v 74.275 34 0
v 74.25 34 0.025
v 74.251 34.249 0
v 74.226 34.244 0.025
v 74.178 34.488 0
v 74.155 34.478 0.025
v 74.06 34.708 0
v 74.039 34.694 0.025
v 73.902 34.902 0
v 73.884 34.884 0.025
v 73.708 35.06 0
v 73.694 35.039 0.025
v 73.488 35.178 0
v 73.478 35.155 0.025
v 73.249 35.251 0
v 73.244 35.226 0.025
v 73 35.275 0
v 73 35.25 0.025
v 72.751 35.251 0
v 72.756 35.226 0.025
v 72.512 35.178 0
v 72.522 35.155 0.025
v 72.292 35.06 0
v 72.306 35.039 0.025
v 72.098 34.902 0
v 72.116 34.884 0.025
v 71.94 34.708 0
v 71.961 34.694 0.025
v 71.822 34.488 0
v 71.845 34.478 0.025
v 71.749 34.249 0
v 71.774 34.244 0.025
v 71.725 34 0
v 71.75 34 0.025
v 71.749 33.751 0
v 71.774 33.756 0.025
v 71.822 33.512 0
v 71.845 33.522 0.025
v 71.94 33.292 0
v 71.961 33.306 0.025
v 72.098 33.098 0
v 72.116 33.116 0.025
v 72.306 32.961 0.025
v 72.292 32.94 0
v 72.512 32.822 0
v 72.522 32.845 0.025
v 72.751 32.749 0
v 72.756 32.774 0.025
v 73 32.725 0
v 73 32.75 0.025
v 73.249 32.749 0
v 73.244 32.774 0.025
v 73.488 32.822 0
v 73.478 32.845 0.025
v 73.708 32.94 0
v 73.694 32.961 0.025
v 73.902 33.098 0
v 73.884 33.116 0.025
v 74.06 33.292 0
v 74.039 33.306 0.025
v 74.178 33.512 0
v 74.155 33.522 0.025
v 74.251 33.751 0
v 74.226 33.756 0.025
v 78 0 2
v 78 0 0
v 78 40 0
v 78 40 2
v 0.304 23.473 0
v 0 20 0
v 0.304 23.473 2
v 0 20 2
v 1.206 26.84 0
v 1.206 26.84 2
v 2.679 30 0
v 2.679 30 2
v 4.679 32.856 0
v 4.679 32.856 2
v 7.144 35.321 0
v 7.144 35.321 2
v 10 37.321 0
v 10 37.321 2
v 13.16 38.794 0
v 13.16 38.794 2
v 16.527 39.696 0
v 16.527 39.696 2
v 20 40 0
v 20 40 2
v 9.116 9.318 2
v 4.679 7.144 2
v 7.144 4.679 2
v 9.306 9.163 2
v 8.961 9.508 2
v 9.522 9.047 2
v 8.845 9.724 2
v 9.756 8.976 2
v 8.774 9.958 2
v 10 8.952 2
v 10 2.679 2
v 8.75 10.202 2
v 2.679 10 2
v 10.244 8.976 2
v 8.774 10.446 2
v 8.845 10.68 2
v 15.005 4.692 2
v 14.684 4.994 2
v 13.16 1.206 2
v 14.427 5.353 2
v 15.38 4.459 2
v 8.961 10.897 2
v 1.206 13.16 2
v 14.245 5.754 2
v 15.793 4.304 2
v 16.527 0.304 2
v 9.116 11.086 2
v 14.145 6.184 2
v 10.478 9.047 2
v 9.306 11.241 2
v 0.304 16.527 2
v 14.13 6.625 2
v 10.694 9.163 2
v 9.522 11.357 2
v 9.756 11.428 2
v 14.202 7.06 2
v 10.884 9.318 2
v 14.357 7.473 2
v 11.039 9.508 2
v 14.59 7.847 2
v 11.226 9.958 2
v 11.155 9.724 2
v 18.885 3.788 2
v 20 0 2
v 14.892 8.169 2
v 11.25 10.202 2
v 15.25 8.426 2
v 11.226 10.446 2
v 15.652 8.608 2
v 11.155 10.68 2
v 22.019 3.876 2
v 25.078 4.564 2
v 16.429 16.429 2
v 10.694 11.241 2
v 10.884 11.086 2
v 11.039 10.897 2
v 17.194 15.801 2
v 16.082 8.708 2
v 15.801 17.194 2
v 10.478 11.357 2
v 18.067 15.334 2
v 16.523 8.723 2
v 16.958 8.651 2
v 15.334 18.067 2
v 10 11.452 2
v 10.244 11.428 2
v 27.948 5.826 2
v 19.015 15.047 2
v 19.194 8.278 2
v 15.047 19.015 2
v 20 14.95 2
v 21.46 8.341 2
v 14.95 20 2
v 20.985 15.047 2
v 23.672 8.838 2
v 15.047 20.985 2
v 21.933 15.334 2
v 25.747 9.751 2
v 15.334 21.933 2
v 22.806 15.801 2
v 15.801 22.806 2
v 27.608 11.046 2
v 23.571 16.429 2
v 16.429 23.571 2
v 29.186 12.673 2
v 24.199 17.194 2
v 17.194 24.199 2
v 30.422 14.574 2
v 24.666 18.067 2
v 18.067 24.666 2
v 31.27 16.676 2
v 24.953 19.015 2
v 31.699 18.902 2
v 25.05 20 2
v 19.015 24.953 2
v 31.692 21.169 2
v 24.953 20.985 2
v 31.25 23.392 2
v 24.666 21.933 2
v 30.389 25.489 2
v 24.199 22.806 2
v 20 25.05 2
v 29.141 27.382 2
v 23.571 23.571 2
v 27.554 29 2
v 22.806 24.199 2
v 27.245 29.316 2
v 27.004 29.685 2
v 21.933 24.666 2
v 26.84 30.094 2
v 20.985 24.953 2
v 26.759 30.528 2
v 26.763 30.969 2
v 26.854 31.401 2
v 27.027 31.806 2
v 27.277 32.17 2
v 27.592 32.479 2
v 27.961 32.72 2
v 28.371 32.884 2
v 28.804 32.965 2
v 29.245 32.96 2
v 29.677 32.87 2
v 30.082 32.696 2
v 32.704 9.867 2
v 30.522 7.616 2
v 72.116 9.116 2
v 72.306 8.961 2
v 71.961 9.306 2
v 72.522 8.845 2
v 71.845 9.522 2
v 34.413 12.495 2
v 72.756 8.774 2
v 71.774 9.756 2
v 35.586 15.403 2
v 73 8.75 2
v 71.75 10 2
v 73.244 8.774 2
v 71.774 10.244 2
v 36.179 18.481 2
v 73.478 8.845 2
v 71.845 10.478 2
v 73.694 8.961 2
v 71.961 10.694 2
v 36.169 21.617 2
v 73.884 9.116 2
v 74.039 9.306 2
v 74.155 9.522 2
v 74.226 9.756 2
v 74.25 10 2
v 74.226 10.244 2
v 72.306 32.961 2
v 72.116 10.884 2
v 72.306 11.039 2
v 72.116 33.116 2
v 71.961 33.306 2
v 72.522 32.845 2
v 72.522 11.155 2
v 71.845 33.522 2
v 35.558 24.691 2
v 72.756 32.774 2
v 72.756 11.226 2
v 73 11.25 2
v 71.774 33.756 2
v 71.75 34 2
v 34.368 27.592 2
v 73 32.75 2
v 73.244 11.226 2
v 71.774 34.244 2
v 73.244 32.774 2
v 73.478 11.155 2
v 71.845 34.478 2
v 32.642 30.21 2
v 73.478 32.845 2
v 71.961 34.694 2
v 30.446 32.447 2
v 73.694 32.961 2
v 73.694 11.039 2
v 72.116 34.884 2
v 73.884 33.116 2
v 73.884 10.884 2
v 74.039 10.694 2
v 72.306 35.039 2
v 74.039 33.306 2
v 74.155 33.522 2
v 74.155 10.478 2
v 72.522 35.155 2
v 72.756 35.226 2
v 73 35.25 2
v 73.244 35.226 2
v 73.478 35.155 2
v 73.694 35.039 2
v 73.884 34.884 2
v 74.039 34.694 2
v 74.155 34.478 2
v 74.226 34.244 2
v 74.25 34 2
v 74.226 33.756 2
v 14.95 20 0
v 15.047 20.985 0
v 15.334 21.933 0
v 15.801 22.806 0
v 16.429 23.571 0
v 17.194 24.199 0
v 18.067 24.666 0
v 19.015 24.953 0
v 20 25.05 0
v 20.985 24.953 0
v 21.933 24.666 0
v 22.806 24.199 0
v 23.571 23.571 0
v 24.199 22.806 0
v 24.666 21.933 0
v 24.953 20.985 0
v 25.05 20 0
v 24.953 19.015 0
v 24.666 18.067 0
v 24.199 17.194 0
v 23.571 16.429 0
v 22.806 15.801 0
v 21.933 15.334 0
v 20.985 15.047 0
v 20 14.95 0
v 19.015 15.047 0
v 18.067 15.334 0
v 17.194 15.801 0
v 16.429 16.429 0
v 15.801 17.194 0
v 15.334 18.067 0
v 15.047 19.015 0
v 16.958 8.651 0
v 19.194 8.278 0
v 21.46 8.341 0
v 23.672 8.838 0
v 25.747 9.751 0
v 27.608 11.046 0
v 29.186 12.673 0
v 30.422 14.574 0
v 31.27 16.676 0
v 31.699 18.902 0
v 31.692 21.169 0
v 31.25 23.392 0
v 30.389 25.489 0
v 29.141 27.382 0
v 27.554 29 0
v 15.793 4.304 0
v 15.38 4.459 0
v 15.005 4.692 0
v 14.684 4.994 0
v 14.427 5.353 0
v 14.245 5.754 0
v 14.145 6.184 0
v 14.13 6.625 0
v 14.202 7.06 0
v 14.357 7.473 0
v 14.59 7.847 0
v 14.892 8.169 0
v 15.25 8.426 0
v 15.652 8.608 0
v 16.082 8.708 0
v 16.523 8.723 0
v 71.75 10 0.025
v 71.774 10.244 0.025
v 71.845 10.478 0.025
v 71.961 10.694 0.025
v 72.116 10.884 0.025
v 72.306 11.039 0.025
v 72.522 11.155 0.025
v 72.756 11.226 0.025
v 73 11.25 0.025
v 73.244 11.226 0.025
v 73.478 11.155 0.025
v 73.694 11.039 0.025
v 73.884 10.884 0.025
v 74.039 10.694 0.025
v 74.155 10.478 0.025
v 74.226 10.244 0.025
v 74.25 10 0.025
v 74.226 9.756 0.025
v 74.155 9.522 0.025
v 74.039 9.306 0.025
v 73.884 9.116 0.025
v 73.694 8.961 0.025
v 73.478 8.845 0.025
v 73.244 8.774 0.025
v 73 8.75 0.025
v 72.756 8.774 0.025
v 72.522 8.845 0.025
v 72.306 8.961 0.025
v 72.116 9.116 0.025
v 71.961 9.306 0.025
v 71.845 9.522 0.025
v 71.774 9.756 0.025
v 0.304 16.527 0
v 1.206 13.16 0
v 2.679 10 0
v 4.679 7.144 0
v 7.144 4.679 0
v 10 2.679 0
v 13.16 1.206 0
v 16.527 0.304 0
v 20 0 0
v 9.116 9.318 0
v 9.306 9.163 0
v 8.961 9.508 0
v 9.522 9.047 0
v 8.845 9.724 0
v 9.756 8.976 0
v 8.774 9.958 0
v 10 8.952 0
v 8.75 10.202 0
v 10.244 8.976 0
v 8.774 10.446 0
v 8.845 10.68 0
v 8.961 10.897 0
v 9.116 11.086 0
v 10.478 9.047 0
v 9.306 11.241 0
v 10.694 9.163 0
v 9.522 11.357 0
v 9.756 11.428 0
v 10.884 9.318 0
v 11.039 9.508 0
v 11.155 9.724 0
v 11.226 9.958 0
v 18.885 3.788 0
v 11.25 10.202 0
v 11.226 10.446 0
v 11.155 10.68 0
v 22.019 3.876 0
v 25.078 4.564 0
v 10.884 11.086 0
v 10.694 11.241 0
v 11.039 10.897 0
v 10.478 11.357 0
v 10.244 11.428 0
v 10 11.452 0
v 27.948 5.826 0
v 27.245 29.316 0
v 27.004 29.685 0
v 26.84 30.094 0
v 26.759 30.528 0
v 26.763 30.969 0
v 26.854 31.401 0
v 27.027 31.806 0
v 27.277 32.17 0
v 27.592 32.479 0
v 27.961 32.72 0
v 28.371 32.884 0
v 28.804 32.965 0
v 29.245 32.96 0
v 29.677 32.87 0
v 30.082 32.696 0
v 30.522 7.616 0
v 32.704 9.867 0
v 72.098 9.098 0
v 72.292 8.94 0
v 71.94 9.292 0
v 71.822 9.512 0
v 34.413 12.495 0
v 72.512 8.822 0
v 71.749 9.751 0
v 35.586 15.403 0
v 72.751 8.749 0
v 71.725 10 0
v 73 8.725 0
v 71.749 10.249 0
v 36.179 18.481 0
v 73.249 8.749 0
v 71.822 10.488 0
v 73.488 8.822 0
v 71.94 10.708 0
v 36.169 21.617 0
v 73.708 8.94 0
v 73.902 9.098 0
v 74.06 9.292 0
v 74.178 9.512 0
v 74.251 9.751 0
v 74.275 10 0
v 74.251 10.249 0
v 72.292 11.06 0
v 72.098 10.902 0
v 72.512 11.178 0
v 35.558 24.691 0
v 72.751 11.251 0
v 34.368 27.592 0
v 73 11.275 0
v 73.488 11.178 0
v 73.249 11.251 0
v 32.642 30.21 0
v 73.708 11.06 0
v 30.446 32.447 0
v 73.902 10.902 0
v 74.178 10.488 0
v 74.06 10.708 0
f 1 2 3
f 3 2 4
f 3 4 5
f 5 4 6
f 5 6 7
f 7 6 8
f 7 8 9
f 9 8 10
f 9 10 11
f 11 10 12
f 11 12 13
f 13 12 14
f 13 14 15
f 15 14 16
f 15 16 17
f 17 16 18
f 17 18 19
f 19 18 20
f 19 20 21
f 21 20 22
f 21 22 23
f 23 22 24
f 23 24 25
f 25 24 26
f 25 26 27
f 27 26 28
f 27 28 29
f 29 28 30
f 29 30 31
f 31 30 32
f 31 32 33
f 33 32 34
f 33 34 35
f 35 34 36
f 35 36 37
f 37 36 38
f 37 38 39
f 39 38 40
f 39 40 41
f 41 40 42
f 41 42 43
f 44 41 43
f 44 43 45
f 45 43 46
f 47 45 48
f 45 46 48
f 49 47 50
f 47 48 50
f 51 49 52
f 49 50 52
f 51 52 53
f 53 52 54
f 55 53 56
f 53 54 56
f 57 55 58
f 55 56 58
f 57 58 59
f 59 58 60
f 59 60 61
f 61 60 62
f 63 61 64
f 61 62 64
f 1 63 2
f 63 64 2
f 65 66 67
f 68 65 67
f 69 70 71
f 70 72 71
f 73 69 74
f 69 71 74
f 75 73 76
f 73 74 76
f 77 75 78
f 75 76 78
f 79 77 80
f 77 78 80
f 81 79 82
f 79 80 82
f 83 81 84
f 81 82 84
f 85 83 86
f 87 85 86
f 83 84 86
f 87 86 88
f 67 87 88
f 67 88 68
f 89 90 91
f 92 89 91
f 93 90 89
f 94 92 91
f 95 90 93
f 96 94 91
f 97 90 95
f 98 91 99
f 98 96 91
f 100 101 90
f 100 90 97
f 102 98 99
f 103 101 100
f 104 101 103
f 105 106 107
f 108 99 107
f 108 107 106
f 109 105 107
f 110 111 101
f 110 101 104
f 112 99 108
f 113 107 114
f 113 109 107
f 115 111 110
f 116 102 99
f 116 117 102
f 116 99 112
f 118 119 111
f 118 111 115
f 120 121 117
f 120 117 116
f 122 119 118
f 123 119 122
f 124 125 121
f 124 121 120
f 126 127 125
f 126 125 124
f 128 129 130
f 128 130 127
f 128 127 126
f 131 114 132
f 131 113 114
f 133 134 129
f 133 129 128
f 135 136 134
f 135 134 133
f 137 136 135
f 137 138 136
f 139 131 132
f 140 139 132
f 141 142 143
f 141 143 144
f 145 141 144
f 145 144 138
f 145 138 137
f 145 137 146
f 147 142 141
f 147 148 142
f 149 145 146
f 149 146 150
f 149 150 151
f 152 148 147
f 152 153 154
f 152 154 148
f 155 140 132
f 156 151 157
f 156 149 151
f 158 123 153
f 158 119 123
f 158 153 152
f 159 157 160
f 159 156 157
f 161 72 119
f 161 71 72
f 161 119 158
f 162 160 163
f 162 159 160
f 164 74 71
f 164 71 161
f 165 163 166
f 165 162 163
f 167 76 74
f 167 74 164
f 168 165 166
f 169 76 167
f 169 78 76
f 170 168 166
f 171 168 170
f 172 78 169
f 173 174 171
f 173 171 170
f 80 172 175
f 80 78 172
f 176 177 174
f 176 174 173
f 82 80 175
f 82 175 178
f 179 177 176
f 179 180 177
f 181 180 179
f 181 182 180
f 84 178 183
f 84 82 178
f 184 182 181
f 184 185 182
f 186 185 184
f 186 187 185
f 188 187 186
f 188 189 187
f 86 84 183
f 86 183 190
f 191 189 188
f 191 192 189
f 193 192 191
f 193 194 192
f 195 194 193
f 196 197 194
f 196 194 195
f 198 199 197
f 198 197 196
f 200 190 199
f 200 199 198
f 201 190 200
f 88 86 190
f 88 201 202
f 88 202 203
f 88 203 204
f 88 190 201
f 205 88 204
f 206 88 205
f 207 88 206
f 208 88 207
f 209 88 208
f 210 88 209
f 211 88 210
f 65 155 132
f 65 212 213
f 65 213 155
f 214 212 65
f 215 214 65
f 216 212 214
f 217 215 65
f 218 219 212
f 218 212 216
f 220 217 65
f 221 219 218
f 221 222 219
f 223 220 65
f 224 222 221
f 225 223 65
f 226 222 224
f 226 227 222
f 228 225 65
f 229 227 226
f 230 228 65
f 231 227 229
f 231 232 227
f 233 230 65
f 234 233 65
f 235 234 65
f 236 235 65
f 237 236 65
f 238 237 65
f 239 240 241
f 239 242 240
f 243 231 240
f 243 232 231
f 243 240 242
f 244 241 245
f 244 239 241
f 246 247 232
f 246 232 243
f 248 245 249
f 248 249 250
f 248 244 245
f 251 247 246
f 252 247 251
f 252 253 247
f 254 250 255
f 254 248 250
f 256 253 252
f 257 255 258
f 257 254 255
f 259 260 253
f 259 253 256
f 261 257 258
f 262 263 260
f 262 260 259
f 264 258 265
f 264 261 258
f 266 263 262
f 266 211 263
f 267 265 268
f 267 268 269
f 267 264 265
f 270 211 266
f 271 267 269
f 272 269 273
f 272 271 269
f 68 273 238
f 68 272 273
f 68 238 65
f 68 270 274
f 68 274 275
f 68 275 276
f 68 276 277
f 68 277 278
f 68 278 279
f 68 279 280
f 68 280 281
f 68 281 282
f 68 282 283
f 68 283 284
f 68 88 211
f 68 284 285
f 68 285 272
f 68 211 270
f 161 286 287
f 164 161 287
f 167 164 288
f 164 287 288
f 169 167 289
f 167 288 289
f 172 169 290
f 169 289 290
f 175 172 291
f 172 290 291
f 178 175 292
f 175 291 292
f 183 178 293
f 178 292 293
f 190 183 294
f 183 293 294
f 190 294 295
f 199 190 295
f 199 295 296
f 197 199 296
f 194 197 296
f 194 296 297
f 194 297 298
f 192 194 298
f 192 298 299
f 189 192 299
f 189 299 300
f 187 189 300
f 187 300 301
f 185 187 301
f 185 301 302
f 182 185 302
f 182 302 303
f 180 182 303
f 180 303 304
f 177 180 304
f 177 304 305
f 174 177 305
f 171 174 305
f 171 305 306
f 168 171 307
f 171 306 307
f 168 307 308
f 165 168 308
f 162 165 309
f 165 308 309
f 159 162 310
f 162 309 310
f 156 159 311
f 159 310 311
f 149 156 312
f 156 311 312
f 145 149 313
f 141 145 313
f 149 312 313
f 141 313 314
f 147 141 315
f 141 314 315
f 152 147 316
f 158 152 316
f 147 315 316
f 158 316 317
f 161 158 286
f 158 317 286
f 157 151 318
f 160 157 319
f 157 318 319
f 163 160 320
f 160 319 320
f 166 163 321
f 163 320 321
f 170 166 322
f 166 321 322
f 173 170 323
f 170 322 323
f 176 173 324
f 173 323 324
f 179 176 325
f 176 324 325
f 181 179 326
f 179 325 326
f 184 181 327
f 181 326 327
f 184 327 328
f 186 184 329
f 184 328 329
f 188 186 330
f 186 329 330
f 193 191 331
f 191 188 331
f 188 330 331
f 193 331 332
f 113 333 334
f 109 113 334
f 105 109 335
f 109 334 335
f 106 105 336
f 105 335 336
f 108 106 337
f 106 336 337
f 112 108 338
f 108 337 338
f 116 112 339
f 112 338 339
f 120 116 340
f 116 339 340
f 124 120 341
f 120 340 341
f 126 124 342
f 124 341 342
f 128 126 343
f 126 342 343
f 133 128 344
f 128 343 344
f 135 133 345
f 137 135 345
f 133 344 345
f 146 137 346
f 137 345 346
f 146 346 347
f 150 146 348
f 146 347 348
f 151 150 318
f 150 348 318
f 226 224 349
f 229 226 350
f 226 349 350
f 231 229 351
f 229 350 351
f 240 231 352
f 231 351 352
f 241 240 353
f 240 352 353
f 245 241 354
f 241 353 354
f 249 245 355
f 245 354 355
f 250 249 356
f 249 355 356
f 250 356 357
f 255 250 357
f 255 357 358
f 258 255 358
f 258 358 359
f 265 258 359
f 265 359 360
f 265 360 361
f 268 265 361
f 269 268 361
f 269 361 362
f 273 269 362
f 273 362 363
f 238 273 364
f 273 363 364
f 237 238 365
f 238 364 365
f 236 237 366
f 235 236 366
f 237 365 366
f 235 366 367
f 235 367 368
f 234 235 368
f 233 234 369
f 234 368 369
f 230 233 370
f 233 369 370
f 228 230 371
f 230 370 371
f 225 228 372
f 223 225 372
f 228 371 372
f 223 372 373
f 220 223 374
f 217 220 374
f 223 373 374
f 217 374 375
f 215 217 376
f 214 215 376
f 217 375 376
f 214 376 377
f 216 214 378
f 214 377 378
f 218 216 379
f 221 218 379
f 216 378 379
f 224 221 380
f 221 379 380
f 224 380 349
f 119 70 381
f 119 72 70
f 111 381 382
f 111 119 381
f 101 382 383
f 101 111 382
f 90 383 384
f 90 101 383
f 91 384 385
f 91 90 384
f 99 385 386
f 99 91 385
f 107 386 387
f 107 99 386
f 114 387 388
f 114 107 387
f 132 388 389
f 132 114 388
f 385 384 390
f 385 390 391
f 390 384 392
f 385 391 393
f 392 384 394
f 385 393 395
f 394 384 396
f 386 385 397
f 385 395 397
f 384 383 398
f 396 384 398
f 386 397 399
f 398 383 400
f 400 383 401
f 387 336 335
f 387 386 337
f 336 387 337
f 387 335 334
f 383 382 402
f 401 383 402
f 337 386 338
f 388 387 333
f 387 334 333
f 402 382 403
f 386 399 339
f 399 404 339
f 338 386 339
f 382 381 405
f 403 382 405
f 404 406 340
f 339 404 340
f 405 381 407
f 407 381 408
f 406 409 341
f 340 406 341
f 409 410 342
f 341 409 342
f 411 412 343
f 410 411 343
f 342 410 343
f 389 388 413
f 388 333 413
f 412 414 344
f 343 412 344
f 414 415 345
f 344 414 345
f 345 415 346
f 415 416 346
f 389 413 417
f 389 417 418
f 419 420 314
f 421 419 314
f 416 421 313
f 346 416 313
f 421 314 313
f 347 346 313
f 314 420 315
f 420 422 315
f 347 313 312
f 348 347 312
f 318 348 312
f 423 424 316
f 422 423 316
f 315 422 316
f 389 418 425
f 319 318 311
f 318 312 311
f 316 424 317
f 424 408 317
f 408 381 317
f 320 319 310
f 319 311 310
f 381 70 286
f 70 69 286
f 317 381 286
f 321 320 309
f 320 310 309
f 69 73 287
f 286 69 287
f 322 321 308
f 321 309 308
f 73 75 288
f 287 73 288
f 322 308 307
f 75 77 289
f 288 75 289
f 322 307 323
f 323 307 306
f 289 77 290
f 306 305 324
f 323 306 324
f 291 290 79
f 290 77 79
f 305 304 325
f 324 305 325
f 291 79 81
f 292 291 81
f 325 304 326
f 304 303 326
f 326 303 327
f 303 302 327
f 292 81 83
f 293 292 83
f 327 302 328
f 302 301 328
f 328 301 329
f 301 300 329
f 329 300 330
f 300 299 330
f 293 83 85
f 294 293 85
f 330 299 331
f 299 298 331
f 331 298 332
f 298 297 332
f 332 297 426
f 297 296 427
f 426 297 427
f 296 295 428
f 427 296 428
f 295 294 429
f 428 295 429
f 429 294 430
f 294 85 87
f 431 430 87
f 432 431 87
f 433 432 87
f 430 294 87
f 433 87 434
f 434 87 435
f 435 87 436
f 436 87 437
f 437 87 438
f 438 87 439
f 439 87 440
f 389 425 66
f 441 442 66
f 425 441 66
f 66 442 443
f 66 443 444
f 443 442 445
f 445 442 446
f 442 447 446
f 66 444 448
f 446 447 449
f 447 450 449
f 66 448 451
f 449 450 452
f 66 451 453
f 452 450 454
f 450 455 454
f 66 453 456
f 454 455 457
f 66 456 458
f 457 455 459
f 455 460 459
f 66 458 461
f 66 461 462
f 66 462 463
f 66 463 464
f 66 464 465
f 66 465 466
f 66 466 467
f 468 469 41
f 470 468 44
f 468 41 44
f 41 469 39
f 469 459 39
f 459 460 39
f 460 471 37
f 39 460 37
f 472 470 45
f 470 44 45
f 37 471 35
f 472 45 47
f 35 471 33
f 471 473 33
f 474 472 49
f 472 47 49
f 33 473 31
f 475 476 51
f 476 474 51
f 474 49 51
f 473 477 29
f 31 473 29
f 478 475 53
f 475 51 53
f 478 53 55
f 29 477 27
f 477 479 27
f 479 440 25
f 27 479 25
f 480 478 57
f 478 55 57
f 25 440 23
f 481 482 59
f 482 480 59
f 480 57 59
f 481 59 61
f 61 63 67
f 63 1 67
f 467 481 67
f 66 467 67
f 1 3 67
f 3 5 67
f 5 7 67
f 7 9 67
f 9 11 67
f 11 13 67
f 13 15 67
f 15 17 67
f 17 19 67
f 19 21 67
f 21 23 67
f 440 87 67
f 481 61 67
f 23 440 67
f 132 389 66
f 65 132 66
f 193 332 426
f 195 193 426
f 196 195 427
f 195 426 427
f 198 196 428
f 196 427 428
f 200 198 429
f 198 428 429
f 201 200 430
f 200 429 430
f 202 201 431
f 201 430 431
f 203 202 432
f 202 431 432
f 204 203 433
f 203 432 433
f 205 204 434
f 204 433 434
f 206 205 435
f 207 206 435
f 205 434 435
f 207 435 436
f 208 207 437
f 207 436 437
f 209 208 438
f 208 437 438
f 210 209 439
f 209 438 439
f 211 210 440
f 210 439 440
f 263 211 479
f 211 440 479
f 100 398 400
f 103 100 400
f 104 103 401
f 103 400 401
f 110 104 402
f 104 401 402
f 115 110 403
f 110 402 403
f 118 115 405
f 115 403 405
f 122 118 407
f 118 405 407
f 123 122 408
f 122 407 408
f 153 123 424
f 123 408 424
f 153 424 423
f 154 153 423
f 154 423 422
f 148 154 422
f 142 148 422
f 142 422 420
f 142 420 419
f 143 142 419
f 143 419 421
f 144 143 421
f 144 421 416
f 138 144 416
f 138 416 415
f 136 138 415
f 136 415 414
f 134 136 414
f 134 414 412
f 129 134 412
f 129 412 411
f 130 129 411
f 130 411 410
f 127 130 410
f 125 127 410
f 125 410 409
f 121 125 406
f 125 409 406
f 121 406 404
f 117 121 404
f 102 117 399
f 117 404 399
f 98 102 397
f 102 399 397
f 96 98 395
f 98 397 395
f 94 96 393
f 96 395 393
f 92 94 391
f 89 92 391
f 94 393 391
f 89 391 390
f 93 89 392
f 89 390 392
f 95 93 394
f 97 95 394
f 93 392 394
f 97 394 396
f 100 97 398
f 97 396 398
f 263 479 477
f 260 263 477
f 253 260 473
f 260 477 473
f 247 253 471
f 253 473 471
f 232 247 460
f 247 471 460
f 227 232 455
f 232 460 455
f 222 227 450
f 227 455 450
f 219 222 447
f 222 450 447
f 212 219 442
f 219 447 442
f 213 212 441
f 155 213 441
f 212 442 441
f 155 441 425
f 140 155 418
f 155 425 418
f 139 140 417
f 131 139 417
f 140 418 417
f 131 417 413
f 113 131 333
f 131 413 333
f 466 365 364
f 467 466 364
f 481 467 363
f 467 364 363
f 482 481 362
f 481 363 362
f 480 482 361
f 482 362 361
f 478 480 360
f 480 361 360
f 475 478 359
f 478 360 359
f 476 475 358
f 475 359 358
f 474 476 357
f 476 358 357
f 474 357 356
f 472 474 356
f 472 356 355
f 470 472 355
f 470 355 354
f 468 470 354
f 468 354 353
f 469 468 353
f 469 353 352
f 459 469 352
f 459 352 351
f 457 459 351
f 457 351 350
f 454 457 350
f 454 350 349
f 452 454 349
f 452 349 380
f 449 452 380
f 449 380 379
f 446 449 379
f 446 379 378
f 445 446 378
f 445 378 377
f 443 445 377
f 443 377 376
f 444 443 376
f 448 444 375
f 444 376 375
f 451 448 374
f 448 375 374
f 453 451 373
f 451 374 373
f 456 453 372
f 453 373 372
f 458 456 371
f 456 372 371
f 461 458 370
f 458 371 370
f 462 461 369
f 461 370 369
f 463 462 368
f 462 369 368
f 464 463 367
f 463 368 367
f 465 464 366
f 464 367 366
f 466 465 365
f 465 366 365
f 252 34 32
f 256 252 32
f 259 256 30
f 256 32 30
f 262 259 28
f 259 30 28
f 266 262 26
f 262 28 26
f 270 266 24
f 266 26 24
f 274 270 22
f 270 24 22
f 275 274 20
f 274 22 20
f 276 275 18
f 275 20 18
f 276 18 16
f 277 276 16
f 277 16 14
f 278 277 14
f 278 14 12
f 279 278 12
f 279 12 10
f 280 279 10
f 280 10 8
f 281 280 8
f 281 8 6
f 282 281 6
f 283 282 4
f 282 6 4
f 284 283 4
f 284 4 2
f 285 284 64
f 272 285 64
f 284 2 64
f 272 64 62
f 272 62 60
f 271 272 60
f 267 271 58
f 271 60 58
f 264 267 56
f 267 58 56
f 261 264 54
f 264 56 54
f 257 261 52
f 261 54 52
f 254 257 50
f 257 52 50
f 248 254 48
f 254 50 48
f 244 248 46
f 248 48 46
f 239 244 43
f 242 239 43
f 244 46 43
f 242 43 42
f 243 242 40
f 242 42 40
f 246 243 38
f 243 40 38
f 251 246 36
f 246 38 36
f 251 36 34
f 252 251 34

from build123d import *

# Parameters (mm, degrees)
SKETCH_2_W                   = 78
SKETCH_2_H                   = 40
EXTRUDE_1_DEPTH              = 2
SKETCH_3_R                   = 5.05
SKETCH_3_R_2                 = 1.25
CUT_EXTRUDE_1_DEPTH          = 88.681240867
SKETCH_4_R                   = 1.25
CUT_EXTRUDE_2_DEPTH          = 88.681240867
FILLET_1_R                   = 20
HOLE_WIZARD_M3_1_D           = 2.5
HOLE_WIZARD_M3_1_CSINK_D     = 2.55
HOLE_WIZARD_M3_1_CSINK_ANGLE = 90


with BuildPart() as part:
    # 草图2 → 凸台-拉伸1 (new body)
    with BuildSketch(Plane.XY):
        with Locations((39, 20)):
            Rectangle(SKETCH_2_W, SKETCH_2_H)
    extrude(amount=EXTRUDE_1_DEPTH)

    # 草图3 → 切除-拉伸1 (cut, through all)
    with BuildSketch(Plane(origin=(0, 0, 0), x_dir=(-1, 0, 0), z_dir=(0, 0, -1))):
        with Locations((-20, 20)):
            Circle(SKETCH_3_R)
        with Locations((-10, 10.202041029)):
            Circle(SKETCH_3_R_2)
        with BuildLine():
            ThreePointArc((-30.446428571, 32.447274003), (-34.413244876, 12.495276677), (-15.792765742, 4.30408716))
            ThreePointArc((-15.792765742, 4.30408716), (-14.20202563, 7.059907527), (-16.957845998, 8.650647638))
            ThreePointArc((-16.957845998, 8.650647638), (-30.421884756, 14.573507751), (-27.553571429, 29.000336587))
            ThreePointArc((-27.553571429, 29.000336587), (-27.276531292, 32.170233866), (-30.446428571, 32.447274003))
        make_face()
    extrude(amount=-CUT_EXTRUDE_1_DEPTH, mode=Mode.SUBTRACT)

    # 草图4 → 切除-拉伸2 (cut, through all)
    with BuildSketch(Plane(origin=(0, 0, 0), x_dir=(-1, 0, 0), z_dir=(0, 0, -1))):
        with Locations((-73, 34)):
            Circle(SKETCH_4_R)
        with Locations((-73, 10)):
            Circle(SKETCH_4_R)
    extrude(amount=-CUT_EXTRUDE_2_DEPTH, mode=Mode.SUBTRACT)

    # 圆角1
    fillet_1_edges = [part.edges().sort_by_distance(p)[0] for p in [
        (0, 40, 1),
        (0, 0, 1),
    ]]
    fillet(fillet_1_edges, radius=FILLET_1_R - 0.0001)  # a hair under: the kernel refuses the full size

    # M3 螺纹孔的螺纹孔钻头1 (through all)
    with Locations(Plane(origin=(73, 34, 0), x_dir=(-1, 0, 0), z_dir=(0, 0, -1))):
        with Locations((0, 0), (0, -24)):
            CounterSinkHole(HOLE_WIZARD_M3_1_D / 2, HOLE_WIZARD_M3_1_CSINK_D / 2, counter_sink_angle=HOLE_WIZARD_M3_1_CSINK_ANGLE)


solid = part.part
